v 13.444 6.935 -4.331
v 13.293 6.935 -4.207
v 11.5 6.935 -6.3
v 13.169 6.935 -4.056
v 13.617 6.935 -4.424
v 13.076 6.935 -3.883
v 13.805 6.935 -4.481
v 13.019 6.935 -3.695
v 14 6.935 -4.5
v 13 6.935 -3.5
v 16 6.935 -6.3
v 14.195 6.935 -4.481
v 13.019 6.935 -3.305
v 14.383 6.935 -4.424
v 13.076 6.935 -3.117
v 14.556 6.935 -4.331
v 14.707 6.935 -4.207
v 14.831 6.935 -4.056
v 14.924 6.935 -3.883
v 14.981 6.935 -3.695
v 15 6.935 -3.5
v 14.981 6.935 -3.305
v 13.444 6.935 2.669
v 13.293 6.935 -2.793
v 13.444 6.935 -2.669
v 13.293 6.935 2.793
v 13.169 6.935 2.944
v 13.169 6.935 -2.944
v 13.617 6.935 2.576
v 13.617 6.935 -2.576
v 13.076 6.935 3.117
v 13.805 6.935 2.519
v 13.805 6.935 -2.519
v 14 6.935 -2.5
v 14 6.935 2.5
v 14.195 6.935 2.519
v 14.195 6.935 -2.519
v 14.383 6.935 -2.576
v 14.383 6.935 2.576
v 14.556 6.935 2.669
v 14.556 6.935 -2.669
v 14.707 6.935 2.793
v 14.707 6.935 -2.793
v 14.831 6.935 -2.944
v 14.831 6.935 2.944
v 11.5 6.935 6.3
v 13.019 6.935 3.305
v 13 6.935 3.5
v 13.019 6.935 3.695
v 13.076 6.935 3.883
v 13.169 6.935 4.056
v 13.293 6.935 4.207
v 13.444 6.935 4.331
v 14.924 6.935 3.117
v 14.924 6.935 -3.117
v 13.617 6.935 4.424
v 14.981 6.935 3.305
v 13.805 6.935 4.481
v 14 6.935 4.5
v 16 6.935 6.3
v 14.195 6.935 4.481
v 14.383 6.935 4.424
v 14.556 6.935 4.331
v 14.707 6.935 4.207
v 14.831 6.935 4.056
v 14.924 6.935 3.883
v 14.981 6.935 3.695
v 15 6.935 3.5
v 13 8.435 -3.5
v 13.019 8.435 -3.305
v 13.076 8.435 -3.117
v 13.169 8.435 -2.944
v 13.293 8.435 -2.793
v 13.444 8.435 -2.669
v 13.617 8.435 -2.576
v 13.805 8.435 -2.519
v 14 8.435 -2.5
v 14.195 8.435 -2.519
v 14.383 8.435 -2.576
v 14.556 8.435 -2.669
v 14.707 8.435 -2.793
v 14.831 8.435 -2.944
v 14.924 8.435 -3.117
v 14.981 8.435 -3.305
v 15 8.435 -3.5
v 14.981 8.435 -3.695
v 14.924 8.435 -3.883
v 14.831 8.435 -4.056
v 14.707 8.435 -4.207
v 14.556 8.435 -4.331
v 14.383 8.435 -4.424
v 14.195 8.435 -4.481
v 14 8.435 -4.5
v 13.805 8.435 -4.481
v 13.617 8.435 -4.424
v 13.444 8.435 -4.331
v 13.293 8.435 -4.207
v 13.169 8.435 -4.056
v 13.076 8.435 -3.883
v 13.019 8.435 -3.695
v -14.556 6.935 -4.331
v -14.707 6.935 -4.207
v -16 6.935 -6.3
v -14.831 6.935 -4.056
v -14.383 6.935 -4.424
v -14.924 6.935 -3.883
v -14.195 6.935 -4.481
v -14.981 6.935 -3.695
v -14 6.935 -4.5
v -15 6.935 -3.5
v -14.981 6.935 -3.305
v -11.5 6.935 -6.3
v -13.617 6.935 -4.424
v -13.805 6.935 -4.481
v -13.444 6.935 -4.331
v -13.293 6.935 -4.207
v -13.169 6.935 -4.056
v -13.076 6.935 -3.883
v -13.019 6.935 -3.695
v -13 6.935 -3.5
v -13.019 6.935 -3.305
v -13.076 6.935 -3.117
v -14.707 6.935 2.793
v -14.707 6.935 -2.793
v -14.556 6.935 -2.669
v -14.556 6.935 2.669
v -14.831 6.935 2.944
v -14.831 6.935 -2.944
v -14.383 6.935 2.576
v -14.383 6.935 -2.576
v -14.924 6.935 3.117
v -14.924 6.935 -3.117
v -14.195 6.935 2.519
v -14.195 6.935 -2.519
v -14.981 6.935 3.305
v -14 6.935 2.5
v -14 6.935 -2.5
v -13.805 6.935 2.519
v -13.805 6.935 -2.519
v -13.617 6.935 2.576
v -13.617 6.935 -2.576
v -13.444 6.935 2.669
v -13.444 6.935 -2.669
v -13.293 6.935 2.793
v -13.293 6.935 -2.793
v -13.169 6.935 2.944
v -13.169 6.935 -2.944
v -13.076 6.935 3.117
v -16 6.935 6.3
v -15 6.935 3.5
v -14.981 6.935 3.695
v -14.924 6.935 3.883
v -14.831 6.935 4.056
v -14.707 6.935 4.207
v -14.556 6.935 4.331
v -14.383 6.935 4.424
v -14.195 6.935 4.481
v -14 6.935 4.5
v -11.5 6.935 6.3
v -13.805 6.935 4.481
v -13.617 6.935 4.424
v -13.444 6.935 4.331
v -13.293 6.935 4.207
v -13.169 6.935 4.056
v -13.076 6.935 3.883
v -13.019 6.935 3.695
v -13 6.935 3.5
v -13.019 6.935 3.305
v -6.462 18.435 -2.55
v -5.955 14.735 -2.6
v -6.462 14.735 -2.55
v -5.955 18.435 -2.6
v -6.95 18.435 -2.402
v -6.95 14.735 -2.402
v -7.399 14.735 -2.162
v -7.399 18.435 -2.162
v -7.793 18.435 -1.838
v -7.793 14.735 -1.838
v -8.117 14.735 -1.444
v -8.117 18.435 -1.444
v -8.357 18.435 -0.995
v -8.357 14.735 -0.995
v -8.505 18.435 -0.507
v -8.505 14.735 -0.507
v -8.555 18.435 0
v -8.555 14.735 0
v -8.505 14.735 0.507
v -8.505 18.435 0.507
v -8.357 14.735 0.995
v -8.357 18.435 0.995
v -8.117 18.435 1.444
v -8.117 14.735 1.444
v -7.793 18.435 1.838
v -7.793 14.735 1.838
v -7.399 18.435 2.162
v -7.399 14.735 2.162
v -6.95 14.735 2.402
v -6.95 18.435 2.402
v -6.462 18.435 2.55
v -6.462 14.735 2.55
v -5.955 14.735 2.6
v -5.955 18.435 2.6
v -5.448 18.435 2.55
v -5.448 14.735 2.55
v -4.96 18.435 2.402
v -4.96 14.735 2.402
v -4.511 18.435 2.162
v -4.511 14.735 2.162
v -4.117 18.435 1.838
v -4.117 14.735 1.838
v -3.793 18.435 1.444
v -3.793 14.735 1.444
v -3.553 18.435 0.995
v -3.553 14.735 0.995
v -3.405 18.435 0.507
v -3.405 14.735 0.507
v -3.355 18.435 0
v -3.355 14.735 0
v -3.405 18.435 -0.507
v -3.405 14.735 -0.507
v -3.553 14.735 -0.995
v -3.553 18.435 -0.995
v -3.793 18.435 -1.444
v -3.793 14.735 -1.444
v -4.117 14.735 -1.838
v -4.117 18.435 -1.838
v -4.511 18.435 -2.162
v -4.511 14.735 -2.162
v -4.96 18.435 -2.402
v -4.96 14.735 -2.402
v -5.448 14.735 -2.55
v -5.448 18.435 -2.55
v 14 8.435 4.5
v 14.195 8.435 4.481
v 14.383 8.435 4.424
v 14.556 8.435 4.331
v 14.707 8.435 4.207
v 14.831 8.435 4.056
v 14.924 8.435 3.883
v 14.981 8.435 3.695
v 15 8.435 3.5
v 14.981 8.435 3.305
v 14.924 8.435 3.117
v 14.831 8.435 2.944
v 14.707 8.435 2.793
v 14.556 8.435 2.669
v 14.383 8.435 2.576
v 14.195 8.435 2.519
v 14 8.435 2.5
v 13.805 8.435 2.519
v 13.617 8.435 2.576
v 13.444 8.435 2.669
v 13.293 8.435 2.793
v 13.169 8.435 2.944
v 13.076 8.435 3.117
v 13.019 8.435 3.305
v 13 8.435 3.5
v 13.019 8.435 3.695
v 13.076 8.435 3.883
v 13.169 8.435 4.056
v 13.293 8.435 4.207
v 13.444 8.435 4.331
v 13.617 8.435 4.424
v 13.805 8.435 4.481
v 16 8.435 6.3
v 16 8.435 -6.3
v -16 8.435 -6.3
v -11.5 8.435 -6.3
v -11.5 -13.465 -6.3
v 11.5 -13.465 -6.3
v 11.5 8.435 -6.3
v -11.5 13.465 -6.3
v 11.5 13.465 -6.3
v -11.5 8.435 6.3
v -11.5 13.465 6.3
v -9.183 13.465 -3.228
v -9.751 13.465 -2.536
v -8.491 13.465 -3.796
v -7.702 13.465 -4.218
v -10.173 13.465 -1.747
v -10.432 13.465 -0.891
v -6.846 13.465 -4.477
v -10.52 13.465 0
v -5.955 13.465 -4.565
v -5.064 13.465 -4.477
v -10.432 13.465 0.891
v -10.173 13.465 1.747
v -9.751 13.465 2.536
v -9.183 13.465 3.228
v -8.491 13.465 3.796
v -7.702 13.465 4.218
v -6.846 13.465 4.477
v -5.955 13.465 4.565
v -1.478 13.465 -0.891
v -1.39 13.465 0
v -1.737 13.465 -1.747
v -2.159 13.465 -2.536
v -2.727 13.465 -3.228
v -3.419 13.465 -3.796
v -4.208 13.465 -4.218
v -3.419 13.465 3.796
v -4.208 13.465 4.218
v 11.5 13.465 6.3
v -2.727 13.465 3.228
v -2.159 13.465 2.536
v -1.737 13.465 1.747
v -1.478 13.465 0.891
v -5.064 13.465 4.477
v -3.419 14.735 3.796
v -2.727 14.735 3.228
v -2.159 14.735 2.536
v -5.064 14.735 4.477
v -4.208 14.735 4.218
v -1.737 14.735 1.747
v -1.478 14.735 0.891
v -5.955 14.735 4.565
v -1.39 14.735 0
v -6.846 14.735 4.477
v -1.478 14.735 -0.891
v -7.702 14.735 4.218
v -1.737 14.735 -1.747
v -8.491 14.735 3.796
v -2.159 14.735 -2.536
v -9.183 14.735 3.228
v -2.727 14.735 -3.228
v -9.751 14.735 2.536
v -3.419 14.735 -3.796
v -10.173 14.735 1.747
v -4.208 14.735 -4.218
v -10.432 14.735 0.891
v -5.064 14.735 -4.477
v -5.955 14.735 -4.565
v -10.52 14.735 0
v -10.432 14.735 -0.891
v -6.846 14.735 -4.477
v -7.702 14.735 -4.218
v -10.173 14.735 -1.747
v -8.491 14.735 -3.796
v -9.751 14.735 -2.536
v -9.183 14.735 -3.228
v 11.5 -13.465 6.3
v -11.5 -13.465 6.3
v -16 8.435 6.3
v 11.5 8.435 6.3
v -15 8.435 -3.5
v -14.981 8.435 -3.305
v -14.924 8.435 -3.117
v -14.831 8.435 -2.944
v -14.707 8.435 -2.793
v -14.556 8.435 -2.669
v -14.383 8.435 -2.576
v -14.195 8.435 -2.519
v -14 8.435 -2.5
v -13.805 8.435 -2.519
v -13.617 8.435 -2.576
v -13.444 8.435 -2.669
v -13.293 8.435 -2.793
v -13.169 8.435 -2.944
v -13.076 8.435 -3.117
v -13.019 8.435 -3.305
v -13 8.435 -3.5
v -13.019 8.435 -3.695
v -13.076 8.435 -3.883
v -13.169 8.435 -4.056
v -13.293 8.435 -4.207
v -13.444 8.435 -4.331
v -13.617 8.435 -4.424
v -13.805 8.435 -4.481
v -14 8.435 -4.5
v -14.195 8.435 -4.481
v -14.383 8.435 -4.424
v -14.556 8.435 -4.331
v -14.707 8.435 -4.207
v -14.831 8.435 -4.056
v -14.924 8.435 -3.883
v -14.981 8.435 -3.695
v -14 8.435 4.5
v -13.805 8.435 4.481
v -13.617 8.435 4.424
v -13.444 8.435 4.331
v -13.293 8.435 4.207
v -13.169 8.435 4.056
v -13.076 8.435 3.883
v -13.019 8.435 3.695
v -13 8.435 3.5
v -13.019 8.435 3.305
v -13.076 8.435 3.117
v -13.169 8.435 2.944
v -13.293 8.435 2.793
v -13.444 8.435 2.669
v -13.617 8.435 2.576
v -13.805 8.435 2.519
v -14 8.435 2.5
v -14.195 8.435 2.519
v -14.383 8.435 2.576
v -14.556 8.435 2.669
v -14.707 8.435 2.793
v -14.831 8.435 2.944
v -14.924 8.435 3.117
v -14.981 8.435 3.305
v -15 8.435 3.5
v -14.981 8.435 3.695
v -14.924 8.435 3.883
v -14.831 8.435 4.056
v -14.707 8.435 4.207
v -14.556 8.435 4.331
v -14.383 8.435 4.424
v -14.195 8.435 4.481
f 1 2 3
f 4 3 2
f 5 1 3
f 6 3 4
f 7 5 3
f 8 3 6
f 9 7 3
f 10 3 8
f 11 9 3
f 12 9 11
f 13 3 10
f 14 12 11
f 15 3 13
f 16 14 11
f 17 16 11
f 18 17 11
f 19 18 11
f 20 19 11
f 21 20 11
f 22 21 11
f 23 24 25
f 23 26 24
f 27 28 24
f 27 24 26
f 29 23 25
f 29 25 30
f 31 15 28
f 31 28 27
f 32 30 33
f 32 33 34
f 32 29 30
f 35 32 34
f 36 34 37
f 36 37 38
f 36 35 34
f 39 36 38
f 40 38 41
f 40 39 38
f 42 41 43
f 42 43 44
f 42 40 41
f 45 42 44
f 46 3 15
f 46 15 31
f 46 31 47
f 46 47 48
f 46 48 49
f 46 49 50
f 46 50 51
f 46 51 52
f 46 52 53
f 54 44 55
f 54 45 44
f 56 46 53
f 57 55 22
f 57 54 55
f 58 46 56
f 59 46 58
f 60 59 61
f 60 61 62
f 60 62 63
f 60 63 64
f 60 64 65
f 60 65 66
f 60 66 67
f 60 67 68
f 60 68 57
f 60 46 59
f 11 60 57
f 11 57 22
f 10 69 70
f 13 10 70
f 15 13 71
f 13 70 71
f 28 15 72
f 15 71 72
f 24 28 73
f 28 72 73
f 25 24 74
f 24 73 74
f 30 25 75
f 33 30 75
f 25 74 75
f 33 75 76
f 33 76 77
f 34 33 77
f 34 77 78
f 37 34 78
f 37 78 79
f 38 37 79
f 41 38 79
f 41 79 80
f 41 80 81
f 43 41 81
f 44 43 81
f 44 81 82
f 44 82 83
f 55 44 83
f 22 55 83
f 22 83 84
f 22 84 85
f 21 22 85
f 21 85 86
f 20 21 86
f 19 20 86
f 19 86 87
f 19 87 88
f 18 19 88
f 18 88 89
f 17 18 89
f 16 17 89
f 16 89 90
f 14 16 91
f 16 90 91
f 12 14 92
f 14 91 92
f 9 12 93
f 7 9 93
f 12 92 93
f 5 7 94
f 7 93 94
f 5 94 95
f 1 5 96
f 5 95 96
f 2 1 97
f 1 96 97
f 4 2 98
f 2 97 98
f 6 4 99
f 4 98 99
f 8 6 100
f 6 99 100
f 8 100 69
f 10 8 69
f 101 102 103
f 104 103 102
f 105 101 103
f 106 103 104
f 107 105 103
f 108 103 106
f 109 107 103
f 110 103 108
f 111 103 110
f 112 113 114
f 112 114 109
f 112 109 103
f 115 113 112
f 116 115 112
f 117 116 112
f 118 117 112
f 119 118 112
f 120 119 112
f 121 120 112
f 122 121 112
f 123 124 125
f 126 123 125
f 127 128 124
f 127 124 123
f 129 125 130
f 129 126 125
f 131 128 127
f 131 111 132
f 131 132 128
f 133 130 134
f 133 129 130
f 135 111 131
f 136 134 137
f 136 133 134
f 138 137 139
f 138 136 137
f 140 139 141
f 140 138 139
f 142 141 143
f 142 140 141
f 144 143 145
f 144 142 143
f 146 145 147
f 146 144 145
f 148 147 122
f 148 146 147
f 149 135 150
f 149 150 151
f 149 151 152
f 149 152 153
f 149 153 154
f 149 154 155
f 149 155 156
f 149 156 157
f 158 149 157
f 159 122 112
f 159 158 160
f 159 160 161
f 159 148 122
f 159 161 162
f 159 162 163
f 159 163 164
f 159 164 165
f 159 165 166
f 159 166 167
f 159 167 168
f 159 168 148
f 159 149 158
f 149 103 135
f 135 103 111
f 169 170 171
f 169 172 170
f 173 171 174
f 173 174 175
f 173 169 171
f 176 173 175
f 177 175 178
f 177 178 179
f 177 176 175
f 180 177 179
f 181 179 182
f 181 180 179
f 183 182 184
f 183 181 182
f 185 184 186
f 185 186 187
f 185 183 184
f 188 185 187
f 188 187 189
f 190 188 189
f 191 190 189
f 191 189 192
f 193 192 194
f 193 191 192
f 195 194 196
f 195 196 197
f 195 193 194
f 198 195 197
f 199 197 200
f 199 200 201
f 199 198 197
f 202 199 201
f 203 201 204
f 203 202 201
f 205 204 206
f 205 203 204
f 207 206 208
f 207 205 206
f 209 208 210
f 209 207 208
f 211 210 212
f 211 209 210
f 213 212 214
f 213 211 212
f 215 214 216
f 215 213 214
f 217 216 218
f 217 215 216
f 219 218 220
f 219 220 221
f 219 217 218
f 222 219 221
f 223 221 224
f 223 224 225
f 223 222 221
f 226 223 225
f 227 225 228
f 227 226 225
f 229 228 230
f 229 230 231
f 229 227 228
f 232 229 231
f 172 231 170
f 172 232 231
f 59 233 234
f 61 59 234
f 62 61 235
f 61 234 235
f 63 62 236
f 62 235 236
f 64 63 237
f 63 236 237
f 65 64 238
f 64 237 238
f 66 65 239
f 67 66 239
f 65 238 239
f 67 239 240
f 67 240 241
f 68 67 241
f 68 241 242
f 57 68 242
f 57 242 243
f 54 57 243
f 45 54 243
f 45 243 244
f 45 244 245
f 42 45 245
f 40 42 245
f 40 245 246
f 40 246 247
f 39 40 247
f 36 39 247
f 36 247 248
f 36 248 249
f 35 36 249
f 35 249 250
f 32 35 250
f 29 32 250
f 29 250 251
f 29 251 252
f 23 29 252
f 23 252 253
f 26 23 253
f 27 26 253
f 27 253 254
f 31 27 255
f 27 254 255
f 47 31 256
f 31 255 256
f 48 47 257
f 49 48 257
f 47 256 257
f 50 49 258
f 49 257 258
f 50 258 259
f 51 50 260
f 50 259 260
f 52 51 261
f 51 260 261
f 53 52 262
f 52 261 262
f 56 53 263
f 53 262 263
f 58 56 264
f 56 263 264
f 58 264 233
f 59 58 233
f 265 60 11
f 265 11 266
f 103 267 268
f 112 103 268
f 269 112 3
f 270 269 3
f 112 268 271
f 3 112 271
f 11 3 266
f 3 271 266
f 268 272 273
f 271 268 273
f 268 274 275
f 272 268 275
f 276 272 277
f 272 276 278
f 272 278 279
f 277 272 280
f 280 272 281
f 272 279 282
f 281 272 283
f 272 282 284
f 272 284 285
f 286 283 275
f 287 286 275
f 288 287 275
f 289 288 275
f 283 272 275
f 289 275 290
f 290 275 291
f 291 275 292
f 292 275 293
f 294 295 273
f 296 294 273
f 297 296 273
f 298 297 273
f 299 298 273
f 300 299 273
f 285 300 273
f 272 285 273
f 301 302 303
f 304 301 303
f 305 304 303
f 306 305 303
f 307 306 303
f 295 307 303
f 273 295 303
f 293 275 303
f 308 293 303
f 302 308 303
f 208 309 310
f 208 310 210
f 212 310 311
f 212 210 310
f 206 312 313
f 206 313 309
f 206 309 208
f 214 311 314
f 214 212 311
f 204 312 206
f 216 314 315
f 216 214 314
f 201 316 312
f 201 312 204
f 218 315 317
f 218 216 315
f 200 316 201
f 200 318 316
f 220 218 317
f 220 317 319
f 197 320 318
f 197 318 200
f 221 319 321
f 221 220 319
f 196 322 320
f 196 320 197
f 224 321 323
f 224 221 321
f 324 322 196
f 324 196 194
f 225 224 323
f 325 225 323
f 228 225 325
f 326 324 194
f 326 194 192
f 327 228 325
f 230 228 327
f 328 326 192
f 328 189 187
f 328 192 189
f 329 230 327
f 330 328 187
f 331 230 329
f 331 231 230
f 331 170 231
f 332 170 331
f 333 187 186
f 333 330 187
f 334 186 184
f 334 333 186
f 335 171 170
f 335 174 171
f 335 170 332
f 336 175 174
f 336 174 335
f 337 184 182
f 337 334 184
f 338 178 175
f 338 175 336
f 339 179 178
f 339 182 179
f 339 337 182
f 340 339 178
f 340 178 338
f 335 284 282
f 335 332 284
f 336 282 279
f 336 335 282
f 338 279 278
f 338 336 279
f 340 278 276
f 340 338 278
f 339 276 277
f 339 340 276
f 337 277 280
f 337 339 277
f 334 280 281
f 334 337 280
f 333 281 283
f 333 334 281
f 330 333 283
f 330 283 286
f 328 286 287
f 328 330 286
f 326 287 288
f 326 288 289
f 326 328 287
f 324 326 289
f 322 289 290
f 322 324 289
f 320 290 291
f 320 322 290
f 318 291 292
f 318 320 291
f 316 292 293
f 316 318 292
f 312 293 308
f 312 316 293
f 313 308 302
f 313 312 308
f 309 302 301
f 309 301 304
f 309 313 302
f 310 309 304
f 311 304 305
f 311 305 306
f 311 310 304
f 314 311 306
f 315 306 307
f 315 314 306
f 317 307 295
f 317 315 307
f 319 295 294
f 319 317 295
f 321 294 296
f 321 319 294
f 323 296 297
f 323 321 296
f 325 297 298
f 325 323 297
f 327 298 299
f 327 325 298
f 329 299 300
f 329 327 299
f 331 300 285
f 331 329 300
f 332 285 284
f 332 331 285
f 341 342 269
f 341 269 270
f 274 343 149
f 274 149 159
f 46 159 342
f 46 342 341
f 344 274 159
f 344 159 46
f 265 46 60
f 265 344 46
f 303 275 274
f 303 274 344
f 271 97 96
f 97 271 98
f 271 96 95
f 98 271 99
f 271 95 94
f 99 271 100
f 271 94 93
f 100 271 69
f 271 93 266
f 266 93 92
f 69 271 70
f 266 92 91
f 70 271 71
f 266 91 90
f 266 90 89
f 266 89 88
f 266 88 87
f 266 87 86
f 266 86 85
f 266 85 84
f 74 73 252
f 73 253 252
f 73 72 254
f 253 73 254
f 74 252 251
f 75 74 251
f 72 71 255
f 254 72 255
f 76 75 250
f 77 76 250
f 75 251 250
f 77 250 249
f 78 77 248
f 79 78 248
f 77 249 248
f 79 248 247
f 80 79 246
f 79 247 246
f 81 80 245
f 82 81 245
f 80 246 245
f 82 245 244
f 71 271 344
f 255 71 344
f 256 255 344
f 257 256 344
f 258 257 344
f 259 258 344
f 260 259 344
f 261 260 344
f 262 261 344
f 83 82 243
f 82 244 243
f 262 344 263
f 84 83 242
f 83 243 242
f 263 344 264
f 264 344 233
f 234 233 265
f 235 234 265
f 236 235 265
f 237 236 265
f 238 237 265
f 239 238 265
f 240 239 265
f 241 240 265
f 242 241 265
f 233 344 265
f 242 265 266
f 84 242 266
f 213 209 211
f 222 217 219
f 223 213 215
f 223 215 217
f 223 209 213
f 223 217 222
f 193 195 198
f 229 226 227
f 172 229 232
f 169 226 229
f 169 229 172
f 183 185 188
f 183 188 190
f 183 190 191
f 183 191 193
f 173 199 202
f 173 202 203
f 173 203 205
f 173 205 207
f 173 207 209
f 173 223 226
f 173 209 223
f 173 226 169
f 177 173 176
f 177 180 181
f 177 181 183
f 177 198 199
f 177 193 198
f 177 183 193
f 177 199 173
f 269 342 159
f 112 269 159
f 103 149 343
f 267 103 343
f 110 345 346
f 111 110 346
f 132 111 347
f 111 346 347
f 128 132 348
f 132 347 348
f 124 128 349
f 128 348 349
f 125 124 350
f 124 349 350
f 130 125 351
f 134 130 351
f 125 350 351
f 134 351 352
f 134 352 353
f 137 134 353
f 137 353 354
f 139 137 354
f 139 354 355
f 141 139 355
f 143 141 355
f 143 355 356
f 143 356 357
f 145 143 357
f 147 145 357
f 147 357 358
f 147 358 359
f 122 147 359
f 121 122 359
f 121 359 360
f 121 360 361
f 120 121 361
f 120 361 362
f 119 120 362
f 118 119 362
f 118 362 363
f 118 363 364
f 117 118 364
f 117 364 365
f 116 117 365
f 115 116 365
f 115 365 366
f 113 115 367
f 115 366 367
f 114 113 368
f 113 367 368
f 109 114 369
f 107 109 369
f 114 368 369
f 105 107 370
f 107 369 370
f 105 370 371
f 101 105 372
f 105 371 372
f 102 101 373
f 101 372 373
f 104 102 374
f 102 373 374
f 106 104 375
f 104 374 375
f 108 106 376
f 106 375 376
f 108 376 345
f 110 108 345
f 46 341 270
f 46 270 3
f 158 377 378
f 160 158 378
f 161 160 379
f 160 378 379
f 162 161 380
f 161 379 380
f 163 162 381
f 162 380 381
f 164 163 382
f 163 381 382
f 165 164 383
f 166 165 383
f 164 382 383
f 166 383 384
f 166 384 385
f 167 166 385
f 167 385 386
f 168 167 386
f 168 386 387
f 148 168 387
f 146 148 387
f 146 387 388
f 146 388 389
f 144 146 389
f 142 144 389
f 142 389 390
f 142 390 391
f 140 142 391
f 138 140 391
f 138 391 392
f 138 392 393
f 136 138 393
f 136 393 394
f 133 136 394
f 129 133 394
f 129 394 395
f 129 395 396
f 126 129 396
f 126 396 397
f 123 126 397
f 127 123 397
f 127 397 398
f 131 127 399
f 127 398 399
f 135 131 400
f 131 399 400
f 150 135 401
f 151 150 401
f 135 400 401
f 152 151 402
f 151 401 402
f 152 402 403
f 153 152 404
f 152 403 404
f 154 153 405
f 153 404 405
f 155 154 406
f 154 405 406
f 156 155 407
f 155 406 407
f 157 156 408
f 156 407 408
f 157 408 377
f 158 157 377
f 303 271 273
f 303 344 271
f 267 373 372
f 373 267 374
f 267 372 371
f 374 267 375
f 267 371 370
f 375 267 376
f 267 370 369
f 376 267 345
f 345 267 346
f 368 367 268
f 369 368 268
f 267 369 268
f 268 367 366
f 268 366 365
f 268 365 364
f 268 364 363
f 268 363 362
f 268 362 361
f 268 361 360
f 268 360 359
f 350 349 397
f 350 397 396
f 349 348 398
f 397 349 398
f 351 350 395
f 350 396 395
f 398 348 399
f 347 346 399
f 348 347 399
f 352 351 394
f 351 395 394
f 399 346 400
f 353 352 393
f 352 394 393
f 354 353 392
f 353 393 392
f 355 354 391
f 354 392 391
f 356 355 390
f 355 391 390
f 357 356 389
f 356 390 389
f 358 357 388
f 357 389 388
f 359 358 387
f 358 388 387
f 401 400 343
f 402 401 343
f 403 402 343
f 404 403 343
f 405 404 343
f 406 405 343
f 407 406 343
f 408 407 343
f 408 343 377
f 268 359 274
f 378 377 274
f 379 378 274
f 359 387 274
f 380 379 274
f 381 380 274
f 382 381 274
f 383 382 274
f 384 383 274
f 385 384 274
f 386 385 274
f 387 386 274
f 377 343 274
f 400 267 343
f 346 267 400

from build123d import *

# Parameters (mm, degrees)
SKETCH_1_W          = 23
SKETCH_1_H          = 5.03
SKETCH_1_W_2        = 4.5
SKETCH_1_H_2        = 1.5
SKETCH_1_H_3        = 20.4
EXTRUDE_1_DEPTH     = 6.3
SKETCH_3_R          = 1
CUT_EXTRUDE_1_DEPTH = 10


with BuildPart() as part:
    # 草图1 → 凸台-拉伸1 (new, symmetric)
    with BuildSketch(Plane.XY):
        with Locations((0, 10.95)):
            Rectangle(SKETCH_1_W, SKETCH_1_H)
        with Locations((13.75, 7.685)):
            Rectangle(SKETCH_1_W_2, SKETCH_1_H_2)
        with Locations((0, -3.265)):
            Rectangle(SKETCH_1_W, SKETCH_1_H_3)
        with Locations((-13.75, 7.685)):
            Rectangle(SKETCH_1_W_2, SKETCH_1_H_2)
        with Locations((0, 7.685)):
            Rectangle(SKETCH_1_W, SKETCH_1_H_2)
    extrude(amount=EXTRUDE_1_DEPTH, both=True)

    # 草图2 → 旋转1 (revolve)
    with BuildSketch(Plane.XY, mode=Mode.PRIVATE) as revolve_1_sk:
        Polygon((-5.955, 13.465), (-10.52, 13.465), (-10.52, 14.735), (-8.555, 14.735), (-8.555, 18.435), (-5.955, 18.435), align=None)
    revolve(revolve_1_sk.sketch.rotate(Axis((-5.955, 10.839744531, 0), (0, 1, 0)), 270), axis=Axis((-5.955, 10.839744531, 0), (0, 1, 0)))

    # 草图3 → 切除-拉伸1 (cut)
    with BuildSketch(Plane(origin=(0, 8.435, 0), x_dir=(1, 0, 0), z_dir=(0, 1, 0))):
        with Locations(Location((-14, 3.5, 0), (0, 0, 180))):
            Circle(SKETCH_3_R)
        with Locations(Location((14, 3.5, 0), (0, 0, 180))):
            Circle(SKETCH_3_R)
        with Locations(Location((14, -3.5, 0), (0, 0, 270))):
            Circle(SKETCH_3_R)
        with Locations(Location((-14, -3.5, 0), (0, 0, 270))):
            Circle(SKETCH_3_R)
    extrude(amount=-CUT_EXTRUDE_1_DEPTH, mode=Mode.SUBTRACT)


solid = part.part
